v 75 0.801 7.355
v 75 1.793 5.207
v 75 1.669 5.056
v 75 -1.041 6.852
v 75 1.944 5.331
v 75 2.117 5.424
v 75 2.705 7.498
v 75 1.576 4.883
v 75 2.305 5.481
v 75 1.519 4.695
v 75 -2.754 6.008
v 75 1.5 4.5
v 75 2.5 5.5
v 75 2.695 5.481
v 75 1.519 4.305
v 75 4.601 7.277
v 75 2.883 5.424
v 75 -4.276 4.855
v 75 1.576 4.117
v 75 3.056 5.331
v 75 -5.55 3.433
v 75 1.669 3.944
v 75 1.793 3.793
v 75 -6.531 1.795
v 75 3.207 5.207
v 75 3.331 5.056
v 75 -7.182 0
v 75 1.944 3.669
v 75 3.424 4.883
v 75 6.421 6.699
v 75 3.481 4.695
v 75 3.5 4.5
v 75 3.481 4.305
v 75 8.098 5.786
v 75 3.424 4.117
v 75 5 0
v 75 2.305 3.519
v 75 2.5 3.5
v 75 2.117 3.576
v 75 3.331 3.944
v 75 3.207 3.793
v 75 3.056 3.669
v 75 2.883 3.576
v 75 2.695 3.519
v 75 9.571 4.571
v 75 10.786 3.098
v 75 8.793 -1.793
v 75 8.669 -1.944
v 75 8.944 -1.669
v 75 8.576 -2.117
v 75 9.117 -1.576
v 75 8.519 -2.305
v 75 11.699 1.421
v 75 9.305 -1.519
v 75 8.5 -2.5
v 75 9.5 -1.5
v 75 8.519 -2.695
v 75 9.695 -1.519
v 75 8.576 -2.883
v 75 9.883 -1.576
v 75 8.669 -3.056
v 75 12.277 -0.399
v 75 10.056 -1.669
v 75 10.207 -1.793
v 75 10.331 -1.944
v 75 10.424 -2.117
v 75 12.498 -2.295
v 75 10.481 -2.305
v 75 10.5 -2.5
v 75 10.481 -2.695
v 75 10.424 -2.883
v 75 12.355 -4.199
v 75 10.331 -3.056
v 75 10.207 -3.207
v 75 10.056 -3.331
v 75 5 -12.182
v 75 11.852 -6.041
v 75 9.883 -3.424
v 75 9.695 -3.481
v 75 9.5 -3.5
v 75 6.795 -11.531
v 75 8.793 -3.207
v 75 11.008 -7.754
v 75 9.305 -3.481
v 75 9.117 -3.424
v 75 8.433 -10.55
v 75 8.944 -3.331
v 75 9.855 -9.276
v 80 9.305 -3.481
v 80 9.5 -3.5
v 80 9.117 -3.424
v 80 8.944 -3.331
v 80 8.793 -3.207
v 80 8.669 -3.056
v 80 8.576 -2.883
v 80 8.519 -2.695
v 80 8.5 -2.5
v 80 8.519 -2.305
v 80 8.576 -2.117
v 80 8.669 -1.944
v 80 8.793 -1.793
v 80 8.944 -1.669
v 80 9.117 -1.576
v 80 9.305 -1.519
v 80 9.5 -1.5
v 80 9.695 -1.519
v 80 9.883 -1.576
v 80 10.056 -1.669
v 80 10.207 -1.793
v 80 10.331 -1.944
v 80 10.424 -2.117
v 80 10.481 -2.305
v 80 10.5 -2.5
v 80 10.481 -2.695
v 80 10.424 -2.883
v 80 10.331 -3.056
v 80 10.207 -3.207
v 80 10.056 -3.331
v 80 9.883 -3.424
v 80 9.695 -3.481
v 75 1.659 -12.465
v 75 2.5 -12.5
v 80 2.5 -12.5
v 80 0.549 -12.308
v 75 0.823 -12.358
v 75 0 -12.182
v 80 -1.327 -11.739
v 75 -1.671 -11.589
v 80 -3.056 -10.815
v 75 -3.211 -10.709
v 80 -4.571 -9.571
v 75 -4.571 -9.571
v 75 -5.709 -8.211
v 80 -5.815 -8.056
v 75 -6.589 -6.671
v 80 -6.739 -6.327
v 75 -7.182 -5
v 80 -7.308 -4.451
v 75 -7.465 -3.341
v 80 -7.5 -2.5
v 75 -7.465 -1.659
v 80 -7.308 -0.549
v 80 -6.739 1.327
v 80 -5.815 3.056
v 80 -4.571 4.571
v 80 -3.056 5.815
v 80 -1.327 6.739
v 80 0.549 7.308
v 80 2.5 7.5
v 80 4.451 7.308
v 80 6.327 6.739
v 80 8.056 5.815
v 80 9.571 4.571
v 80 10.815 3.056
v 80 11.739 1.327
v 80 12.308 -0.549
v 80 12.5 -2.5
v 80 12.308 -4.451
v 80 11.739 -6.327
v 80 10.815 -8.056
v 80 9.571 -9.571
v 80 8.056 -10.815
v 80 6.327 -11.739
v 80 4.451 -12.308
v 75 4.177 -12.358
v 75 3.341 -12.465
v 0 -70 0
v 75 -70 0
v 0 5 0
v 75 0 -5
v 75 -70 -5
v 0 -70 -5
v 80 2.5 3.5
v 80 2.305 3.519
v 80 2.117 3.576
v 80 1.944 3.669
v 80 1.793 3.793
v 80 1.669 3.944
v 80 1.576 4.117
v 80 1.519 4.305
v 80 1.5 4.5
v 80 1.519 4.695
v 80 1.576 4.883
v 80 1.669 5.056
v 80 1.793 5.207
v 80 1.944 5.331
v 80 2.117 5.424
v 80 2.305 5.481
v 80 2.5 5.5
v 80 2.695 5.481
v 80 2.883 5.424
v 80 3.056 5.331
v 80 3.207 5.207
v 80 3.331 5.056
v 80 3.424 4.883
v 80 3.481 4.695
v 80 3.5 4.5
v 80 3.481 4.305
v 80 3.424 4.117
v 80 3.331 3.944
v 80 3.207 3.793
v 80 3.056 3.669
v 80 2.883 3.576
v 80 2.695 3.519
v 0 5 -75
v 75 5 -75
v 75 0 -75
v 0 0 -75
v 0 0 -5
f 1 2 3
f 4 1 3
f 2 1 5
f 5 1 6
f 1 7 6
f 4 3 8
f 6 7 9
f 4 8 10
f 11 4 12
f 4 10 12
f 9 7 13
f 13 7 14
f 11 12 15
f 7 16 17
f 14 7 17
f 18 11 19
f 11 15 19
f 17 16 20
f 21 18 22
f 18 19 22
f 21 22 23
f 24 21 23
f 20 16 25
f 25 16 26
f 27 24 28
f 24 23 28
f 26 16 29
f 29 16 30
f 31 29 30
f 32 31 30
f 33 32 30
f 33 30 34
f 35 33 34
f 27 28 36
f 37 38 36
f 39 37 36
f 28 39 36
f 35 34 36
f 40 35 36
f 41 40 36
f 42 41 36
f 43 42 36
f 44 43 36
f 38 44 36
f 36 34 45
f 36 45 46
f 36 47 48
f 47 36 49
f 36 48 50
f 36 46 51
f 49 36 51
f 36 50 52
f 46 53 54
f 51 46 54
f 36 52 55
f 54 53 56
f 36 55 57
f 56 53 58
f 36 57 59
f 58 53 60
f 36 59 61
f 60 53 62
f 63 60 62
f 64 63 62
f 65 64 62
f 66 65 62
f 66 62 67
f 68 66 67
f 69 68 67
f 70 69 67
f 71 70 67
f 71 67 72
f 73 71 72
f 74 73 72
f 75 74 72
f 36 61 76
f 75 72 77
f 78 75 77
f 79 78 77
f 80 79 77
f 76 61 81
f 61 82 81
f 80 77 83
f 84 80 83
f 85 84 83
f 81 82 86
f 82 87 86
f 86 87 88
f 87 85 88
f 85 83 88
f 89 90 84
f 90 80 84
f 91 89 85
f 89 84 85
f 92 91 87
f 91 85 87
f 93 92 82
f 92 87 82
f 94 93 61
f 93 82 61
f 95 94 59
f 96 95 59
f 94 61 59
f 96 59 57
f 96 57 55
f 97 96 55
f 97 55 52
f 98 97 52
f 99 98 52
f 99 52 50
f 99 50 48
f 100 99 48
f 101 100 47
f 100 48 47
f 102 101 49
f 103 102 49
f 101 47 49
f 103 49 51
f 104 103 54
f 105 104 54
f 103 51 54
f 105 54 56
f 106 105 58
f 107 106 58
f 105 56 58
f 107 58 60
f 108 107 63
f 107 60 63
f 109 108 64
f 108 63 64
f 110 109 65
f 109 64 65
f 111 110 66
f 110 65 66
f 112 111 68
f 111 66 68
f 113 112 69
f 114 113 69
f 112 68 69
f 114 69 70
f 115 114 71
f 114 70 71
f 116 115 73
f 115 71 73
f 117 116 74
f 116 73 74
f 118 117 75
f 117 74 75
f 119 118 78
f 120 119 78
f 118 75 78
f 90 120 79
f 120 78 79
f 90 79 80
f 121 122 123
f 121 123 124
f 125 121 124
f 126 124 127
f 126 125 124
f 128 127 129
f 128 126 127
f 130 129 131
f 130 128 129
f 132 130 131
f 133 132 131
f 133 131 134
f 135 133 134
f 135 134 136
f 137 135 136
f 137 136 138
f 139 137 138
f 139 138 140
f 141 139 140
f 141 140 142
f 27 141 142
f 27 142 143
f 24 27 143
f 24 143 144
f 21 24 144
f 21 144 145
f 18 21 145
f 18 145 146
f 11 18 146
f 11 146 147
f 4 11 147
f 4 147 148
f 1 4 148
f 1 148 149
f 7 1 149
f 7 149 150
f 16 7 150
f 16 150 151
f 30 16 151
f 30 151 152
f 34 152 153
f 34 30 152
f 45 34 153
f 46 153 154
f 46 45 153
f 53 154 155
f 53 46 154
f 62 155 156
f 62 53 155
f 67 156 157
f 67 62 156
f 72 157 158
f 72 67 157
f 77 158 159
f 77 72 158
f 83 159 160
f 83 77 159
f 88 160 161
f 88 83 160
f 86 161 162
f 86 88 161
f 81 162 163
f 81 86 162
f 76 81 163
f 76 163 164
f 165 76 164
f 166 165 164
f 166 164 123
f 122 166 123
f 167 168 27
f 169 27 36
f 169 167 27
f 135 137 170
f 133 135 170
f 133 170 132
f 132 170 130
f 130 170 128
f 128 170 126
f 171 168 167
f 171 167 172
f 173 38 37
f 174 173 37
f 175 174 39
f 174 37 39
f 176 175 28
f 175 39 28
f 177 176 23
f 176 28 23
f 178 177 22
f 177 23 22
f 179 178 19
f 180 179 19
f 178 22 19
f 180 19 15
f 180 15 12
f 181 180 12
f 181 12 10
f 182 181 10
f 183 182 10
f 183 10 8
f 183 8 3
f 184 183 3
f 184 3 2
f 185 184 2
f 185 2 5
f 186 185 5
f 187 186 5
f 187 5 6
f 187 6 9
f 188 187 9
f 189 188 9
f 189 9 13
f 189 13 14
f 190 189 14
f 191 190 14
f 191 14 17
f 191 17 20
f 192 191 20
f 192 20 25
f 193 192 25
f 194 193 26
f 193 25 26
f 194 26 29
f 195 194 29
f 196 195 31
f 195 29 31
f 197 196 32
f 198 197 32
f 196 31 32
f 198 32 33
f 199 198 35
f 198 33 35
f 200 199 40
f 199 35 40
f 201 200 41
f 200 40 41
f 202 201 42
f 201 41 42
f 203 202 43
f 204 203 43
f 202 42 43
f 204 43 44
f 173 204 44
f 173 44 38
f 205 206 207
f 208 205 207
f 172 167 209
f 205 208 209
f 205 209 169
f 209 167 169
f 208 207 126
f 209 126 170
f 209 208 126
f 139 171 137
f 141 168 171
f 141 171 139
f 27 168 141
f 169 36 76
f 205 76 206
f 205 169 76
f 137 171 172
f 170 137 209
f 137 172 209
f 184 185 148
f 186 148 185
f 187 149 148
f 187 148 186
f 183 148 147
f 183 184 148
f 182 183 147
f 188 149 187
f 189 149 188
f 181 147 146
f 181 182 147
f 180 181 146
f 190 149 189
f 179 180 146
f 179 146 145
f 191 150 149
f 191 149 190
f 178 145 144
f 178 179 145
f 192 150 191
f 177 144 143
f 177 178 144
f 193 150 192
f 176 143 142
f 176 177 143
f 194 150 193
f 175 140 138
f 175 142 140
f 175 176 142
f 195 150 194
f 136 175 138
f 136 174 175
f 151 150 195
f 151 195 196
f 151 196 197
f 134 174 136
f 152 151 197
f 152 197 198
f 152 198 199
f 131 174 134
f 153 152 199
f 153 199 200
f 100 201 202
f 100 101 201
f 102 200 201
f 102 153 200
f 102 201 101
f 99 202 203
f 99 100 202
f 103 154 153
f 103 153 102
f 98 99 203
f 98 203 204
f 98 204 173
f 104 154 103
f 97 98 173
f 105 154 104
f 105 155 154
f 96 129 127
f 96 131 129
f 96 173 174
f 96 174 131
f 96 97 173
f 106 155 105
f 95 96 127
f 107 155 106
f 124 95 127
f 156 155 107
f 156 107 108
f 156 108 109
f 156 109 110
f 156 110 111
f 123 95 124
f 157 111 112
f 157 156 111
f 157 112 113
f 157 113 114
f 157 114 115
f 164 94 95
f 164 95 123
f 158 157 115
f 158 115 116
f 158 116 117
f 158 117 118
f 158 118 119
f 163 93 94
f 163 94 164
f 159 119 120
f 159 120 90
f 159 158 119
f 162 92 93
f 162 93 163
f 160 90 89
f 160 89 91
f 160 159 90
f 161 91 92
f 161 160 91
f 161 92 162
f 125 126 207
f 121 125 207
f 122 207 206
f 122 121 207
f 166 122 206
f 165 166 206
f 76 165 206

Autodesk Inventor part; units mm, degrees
ref_plane "YZ Plane" through (0, 0, 0) normal (1, 0, 0) x (0, 1, 0)
ref_plane "XZ Plane" through (0, 0, 0) normal (0, 1, 0) x (-1, 0, 0)
ref_plane "XY Plane" through (0, 0, 0) normal (0, 0, 1) x (1, 0, 0)
sketch "スケッチ2" plane through (0, 0, 0) normal (1, 0, 0) x (0, 1, 0)
  line L0 (0, 0) -> (5, 0)
  line L1 (5, 0) -> (5, -75)
  line L2 (5, -75) -> (0, -75)
  line L3 (0, -75) -> (0, 0)
  line L4 (0, 0) -> (-70, 0)
  line L5 (-70, 0) -> (-70, -5)
  line L6 (-70, -5) -> (0, -5)
  line L7 (0, -5) -> (0, 0)
  point P0 (-70, -2.5)
  point P1 (0, -5)
  dimension "d0" = 75
  dimension "d1" = 75
  dimension "d2" = 5
  dimension "d3" = 5
extrude "押し出し1" add sketch "スケッチ2" along normal blind 75
sketch "スケッチ4" plane through (75, 0, 0) normal (1, 0, 0) x (0, 0, -1)
  line L0 (0, 0) -> (13, 0)
  line L1 (0, 0) -> (5, 0)
  line L2 (75, 5) -> (0, 5) projected
  line L3 (0, 5) -> (0, -70) projected
  circle A0 centre (2.5, 2.5) radius 10
  dimension "d32" = 2.5
  dimension "d33" = 2.5
  dimension "d34" = 20
extrude "押し出し2" add sketch "スケッチ4" along normal blind 5
sketch "スケッチ7" plane through (80, 2.5, -2.5) normal (1, 0, 0) x (0, 0, -1)
  point P0 (-2.5, -2.5)
  point P1 (0, 7)
  point P2 (-7, 0)
  point P3 (0, 0)
  dimension "d35" = 7
  dimension "d36" = 7
hole "穴2" at (80, 9.5, -2.5) at (80, 2.5, 4.5) direction (-1, 0, 0) diameter 2 depth 8.1 tip angle 118
properties part number "排出機構"
